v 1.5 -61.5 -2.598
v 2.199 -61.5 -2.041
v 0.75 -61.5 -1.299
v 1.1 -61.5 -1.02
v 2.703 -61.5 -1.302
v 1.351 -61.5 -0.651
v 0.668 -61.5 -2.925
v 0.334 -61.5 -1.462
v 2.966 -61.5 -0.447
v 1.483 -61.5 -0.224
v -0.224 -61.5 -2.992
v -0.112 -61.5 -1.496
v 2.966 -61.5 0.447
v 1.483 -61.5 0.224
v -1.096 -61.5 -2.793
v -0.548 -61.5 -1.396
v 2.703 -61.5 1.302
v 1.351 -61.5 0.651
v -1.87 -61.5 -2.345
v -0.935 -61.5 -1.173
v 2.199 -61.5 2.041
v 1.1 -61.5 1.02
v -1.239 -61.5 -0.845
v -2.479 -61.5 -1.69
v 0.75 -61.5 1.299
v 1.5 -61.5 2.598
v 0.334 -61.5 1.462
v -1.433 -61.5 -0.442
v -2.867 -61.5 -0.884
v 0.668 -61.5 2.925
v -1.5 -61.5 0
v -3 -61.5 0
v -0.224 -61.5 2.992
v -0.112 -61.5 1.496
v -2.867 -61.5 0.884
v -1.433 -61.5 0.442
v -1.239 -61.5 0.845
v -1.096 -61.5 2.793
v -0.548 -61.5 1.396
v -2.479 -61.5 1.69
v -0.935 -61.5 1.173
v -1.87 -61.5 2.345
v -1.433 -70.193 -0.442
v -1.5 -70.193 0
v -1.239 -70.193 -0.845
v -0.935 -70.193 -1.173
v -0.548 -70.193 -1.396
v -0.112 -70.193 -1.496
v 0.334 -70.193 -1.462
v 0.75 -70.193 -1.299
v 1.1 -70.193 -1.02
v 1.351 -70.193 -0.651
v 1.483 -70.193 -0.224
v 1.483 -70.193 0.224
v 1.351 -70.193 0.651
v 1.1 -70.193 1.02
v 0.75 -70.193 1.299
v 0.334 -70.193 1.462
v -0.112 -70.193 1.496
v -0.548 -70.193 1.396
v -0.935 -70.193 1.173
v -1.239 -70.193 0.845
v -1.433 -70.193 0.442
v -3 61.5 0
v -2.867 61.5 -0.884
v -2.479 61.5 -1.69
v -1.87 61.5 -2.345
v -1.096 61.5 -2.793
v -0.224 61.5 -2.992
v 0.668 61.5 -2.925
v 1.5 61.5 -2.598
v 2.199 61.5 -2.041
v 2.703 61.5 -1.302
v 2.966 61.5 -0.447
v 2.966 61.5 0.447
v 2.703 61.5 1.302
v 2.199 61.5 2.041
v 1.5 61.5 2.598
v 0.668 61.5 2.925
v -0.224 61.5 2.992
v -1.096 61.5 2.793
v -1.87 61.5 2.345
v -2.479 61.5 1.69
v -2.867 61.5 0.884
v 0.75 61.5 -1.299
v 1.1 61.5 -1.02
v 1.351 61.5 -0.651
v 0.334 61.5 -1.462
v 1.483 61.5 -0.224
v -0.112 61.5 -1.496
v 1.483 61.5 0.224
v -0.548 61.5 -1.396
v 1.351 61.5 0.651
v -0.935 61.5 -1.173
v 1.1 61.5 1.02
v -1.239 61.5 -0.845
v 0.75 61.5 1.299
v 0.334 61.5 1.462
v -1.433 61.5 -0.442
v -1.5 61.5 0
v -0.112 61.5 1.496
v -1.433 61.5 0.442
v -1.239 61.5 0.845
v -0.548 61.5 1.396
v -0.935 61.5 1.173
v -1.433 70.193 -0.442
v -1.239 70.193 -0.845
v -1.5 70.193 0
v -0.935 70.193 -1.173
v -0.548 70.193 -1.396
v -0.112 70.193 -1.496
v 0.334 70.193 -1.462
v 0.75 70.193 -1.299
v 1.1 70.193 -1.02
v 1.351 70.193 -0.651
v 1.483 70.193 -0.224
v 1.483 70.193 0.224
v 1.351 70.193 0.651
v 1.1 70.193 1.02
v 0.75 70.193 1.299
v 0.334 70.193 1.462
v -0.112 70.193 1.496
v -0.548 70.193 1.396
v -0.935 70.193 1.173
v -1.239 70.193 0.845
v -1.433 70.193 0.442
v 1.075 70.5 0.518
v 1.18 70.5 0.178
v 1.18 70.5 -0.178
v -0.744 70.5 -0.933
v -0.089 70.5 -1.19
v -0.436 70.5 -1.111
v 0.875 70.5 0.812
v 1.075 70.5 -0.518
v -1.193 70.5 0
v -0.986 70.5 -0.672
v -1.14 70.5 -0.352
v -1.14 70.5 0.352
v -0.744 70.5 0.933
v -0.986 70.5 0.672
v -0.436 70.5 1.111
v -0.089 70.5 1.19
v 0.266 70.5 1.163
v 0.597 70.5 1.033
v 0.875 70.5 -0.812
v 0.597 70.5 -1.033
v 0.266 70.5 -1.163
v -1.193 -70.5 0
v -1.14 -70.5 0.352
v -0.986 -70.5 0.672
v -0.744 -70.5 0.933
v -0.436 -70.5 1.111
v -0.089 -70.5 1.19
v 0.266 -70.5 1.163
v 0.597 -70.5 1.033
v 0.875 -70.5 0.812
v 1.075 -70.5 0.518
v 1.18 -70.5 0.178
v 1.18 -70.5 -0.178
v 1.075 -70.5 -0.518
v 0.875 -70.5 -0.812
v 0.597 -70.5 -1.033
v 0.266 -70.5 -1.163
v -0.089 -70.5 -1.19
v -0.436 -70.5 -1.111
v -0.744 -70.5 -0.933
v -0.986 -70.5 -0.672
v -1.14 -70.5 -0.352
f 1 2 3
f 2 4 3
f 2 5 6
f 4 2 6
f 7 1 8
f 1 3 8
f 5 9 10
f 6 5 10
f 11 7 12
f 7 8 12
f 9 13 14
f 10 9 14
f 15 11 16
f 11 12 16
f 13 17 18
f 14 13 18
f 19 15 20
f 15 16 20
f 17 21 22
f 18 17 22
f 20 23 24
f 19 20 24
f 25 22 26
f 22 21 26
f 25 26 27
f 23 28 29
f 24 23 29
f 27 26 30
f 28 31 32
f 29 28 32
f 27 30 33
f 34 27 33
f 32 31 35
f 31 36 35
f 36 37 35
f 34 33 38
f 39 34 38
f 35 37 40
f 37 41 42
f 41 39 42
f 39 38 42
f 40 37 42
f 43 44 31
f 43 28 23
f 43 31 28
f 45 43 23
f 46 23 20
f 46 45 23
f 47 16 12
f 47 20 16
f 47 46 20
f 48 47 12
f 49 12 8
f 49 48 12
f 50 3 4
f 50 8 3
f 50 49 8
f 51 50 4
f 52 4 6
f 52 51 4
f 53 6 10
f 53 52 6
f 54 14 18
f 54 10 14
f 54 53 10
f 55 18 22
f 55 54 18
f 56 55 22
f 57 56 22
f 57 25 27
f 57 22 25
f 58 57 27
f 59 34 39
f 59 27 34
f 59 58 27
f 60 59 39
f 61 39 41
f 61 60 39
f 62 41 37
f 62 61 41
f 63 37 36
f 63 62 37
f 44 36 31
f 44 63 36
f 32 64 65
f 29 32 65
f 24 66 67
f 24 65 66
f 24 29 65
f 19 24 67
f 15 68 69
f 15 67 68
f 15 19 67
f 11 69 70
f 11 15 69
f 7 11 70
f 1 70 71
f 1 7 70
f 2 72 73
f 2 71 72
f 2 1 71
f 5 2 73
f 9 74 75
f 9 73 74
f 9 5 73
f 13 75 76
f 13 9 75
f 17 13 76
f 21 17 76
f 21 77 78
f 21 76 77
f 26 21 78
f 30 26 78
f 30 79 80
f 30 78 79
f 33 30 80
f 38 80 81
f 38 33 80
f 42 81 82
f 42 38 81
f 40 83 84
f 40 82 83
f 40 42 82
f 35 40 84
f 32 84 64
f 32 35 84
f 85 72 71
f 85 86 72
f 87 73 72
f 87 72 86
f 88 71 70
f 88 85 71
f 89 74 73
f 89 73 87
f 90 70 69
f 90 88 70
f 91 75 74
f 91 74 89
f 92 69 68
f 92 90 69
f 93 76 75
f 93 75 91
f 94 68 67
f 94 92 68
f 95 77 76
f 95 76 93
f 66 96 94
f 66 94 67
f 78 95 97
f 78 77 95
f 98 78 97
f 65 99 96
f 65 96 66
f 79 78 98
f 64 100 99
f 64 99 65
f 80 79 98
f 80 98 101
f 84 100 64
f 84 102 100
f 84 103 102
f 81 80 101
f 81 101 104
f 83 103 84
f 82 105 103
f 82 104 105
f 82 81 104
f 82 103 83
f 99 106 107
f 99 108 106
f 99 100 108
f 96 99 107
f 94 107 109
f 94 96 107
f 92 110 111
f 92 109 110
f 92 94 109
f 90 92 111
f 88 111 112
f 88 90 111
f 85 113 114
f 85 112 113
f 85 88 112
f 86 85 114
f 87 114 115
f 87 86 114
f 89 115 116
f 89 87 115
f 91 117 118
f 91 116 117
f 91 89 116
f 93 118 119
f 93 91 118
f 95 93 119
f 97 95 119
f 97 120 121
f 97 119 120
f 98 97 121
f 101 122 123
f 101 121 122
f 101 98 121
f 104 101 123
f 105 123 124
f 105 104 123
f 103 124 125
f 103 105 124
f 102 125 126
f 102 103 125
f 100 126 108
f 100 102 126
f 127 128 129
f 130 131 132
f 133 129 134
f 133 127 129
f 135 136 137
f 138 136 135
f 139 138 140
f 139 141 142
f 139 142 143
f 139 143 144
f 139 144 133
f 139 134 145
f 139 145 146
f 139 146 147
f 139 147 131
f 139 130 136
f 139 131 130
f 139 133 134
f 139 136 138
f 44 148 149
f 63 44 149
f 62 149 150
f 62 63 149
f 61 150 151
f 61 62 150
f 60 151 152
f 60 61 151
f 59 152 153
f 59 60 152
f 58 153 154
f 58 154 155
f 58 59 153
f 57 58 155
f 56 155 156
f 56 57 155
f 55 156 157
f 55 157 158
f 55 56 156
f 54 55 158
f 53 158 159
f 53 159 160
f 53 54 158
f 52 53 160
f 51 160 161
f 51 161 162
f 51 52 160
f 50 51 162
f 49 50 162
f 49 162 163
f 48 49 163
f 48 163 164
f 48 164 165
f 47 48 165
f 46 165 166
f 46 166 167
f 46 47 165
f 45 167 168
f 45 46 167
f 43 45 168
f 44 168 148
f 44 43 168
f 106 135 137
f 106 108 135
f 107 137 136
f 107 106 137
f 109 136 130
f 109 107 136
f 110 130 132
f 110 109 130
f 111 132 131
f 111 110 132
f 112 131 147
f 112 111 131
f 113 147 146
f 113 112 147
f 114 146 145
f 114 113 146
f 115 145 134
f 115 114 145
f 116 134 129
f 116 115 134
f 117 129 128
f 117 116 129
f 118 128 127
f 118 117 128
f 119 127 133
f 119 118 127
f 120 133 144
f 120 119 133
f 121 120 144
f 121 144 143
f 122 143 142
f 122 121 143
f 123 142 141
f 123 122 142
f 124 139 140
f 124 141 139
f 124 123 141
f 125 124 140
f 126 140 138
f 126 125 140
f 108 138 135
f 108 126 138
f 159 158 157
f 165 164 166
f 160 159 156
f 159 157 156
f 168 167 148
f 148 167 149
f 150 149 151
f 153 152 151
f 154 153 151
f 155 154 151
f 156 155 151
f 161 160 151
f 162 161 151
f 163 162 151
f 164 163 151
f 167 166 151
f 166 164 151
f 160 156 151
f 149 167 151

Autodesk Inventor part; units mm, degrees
ref_plane "YZ Plane" through (0, 0, 0) normal (1, 0, 0) x (0, 1, 0)
ref_plane "XZ Plane" through (0, 0, 0) normal (0, 1, 0) x (-1, 0, 0)
ref_plane "XY Plane" through (0, 0, 0) normal (0, 0, 1) x (1, 0, 0)
sketch "Boceto1" plane through (0, 0, 0) normal (0, 0, 1) x (1, 0, 0)
  line L0 (0, -70.5) -> (0, 70.5)
  line L1 (0, 70.5) -> (-1.5, 70.5)
  line L2 (-1.5, 70.5) -> (-1.5, 61.5)
  line L3 (-1.5, 61.5) -> (-3, 61.5)
  line L4 (-3, 61.5) -> (-3, -61.5)
  line L5 (-3, -61.5) -> (-1.5, -61.5)
  line L6 (-1.5, -61.5) -> (-1.5, -70.5)
  line L7 (-1.5, -70.5) -> (0, -70.5)
  point P0 (0, 0)
  point P1 (0, 0)
  dimension "d1" = 3
  dimension "d2" = 6
  dimension "d3" = 9
  dimension "d4" = 123
  dimension "d8" = 9
revolve "Revolución1" add sketch "Boceto1" angle 360 about axis through (0, -70.5, 0) along (0, 1, 0)
thread "Rosca1" size "M3x0.5" class "6g" standard "ANSI Metric M Profile" full length
chamfer "Chaflán1" distance 0.3067 angle 45 2 edges at (1.5, 70.5, 0) (1.5, -70.5, 0)
properties part number "Columnas" material "Aluminum 7075"
